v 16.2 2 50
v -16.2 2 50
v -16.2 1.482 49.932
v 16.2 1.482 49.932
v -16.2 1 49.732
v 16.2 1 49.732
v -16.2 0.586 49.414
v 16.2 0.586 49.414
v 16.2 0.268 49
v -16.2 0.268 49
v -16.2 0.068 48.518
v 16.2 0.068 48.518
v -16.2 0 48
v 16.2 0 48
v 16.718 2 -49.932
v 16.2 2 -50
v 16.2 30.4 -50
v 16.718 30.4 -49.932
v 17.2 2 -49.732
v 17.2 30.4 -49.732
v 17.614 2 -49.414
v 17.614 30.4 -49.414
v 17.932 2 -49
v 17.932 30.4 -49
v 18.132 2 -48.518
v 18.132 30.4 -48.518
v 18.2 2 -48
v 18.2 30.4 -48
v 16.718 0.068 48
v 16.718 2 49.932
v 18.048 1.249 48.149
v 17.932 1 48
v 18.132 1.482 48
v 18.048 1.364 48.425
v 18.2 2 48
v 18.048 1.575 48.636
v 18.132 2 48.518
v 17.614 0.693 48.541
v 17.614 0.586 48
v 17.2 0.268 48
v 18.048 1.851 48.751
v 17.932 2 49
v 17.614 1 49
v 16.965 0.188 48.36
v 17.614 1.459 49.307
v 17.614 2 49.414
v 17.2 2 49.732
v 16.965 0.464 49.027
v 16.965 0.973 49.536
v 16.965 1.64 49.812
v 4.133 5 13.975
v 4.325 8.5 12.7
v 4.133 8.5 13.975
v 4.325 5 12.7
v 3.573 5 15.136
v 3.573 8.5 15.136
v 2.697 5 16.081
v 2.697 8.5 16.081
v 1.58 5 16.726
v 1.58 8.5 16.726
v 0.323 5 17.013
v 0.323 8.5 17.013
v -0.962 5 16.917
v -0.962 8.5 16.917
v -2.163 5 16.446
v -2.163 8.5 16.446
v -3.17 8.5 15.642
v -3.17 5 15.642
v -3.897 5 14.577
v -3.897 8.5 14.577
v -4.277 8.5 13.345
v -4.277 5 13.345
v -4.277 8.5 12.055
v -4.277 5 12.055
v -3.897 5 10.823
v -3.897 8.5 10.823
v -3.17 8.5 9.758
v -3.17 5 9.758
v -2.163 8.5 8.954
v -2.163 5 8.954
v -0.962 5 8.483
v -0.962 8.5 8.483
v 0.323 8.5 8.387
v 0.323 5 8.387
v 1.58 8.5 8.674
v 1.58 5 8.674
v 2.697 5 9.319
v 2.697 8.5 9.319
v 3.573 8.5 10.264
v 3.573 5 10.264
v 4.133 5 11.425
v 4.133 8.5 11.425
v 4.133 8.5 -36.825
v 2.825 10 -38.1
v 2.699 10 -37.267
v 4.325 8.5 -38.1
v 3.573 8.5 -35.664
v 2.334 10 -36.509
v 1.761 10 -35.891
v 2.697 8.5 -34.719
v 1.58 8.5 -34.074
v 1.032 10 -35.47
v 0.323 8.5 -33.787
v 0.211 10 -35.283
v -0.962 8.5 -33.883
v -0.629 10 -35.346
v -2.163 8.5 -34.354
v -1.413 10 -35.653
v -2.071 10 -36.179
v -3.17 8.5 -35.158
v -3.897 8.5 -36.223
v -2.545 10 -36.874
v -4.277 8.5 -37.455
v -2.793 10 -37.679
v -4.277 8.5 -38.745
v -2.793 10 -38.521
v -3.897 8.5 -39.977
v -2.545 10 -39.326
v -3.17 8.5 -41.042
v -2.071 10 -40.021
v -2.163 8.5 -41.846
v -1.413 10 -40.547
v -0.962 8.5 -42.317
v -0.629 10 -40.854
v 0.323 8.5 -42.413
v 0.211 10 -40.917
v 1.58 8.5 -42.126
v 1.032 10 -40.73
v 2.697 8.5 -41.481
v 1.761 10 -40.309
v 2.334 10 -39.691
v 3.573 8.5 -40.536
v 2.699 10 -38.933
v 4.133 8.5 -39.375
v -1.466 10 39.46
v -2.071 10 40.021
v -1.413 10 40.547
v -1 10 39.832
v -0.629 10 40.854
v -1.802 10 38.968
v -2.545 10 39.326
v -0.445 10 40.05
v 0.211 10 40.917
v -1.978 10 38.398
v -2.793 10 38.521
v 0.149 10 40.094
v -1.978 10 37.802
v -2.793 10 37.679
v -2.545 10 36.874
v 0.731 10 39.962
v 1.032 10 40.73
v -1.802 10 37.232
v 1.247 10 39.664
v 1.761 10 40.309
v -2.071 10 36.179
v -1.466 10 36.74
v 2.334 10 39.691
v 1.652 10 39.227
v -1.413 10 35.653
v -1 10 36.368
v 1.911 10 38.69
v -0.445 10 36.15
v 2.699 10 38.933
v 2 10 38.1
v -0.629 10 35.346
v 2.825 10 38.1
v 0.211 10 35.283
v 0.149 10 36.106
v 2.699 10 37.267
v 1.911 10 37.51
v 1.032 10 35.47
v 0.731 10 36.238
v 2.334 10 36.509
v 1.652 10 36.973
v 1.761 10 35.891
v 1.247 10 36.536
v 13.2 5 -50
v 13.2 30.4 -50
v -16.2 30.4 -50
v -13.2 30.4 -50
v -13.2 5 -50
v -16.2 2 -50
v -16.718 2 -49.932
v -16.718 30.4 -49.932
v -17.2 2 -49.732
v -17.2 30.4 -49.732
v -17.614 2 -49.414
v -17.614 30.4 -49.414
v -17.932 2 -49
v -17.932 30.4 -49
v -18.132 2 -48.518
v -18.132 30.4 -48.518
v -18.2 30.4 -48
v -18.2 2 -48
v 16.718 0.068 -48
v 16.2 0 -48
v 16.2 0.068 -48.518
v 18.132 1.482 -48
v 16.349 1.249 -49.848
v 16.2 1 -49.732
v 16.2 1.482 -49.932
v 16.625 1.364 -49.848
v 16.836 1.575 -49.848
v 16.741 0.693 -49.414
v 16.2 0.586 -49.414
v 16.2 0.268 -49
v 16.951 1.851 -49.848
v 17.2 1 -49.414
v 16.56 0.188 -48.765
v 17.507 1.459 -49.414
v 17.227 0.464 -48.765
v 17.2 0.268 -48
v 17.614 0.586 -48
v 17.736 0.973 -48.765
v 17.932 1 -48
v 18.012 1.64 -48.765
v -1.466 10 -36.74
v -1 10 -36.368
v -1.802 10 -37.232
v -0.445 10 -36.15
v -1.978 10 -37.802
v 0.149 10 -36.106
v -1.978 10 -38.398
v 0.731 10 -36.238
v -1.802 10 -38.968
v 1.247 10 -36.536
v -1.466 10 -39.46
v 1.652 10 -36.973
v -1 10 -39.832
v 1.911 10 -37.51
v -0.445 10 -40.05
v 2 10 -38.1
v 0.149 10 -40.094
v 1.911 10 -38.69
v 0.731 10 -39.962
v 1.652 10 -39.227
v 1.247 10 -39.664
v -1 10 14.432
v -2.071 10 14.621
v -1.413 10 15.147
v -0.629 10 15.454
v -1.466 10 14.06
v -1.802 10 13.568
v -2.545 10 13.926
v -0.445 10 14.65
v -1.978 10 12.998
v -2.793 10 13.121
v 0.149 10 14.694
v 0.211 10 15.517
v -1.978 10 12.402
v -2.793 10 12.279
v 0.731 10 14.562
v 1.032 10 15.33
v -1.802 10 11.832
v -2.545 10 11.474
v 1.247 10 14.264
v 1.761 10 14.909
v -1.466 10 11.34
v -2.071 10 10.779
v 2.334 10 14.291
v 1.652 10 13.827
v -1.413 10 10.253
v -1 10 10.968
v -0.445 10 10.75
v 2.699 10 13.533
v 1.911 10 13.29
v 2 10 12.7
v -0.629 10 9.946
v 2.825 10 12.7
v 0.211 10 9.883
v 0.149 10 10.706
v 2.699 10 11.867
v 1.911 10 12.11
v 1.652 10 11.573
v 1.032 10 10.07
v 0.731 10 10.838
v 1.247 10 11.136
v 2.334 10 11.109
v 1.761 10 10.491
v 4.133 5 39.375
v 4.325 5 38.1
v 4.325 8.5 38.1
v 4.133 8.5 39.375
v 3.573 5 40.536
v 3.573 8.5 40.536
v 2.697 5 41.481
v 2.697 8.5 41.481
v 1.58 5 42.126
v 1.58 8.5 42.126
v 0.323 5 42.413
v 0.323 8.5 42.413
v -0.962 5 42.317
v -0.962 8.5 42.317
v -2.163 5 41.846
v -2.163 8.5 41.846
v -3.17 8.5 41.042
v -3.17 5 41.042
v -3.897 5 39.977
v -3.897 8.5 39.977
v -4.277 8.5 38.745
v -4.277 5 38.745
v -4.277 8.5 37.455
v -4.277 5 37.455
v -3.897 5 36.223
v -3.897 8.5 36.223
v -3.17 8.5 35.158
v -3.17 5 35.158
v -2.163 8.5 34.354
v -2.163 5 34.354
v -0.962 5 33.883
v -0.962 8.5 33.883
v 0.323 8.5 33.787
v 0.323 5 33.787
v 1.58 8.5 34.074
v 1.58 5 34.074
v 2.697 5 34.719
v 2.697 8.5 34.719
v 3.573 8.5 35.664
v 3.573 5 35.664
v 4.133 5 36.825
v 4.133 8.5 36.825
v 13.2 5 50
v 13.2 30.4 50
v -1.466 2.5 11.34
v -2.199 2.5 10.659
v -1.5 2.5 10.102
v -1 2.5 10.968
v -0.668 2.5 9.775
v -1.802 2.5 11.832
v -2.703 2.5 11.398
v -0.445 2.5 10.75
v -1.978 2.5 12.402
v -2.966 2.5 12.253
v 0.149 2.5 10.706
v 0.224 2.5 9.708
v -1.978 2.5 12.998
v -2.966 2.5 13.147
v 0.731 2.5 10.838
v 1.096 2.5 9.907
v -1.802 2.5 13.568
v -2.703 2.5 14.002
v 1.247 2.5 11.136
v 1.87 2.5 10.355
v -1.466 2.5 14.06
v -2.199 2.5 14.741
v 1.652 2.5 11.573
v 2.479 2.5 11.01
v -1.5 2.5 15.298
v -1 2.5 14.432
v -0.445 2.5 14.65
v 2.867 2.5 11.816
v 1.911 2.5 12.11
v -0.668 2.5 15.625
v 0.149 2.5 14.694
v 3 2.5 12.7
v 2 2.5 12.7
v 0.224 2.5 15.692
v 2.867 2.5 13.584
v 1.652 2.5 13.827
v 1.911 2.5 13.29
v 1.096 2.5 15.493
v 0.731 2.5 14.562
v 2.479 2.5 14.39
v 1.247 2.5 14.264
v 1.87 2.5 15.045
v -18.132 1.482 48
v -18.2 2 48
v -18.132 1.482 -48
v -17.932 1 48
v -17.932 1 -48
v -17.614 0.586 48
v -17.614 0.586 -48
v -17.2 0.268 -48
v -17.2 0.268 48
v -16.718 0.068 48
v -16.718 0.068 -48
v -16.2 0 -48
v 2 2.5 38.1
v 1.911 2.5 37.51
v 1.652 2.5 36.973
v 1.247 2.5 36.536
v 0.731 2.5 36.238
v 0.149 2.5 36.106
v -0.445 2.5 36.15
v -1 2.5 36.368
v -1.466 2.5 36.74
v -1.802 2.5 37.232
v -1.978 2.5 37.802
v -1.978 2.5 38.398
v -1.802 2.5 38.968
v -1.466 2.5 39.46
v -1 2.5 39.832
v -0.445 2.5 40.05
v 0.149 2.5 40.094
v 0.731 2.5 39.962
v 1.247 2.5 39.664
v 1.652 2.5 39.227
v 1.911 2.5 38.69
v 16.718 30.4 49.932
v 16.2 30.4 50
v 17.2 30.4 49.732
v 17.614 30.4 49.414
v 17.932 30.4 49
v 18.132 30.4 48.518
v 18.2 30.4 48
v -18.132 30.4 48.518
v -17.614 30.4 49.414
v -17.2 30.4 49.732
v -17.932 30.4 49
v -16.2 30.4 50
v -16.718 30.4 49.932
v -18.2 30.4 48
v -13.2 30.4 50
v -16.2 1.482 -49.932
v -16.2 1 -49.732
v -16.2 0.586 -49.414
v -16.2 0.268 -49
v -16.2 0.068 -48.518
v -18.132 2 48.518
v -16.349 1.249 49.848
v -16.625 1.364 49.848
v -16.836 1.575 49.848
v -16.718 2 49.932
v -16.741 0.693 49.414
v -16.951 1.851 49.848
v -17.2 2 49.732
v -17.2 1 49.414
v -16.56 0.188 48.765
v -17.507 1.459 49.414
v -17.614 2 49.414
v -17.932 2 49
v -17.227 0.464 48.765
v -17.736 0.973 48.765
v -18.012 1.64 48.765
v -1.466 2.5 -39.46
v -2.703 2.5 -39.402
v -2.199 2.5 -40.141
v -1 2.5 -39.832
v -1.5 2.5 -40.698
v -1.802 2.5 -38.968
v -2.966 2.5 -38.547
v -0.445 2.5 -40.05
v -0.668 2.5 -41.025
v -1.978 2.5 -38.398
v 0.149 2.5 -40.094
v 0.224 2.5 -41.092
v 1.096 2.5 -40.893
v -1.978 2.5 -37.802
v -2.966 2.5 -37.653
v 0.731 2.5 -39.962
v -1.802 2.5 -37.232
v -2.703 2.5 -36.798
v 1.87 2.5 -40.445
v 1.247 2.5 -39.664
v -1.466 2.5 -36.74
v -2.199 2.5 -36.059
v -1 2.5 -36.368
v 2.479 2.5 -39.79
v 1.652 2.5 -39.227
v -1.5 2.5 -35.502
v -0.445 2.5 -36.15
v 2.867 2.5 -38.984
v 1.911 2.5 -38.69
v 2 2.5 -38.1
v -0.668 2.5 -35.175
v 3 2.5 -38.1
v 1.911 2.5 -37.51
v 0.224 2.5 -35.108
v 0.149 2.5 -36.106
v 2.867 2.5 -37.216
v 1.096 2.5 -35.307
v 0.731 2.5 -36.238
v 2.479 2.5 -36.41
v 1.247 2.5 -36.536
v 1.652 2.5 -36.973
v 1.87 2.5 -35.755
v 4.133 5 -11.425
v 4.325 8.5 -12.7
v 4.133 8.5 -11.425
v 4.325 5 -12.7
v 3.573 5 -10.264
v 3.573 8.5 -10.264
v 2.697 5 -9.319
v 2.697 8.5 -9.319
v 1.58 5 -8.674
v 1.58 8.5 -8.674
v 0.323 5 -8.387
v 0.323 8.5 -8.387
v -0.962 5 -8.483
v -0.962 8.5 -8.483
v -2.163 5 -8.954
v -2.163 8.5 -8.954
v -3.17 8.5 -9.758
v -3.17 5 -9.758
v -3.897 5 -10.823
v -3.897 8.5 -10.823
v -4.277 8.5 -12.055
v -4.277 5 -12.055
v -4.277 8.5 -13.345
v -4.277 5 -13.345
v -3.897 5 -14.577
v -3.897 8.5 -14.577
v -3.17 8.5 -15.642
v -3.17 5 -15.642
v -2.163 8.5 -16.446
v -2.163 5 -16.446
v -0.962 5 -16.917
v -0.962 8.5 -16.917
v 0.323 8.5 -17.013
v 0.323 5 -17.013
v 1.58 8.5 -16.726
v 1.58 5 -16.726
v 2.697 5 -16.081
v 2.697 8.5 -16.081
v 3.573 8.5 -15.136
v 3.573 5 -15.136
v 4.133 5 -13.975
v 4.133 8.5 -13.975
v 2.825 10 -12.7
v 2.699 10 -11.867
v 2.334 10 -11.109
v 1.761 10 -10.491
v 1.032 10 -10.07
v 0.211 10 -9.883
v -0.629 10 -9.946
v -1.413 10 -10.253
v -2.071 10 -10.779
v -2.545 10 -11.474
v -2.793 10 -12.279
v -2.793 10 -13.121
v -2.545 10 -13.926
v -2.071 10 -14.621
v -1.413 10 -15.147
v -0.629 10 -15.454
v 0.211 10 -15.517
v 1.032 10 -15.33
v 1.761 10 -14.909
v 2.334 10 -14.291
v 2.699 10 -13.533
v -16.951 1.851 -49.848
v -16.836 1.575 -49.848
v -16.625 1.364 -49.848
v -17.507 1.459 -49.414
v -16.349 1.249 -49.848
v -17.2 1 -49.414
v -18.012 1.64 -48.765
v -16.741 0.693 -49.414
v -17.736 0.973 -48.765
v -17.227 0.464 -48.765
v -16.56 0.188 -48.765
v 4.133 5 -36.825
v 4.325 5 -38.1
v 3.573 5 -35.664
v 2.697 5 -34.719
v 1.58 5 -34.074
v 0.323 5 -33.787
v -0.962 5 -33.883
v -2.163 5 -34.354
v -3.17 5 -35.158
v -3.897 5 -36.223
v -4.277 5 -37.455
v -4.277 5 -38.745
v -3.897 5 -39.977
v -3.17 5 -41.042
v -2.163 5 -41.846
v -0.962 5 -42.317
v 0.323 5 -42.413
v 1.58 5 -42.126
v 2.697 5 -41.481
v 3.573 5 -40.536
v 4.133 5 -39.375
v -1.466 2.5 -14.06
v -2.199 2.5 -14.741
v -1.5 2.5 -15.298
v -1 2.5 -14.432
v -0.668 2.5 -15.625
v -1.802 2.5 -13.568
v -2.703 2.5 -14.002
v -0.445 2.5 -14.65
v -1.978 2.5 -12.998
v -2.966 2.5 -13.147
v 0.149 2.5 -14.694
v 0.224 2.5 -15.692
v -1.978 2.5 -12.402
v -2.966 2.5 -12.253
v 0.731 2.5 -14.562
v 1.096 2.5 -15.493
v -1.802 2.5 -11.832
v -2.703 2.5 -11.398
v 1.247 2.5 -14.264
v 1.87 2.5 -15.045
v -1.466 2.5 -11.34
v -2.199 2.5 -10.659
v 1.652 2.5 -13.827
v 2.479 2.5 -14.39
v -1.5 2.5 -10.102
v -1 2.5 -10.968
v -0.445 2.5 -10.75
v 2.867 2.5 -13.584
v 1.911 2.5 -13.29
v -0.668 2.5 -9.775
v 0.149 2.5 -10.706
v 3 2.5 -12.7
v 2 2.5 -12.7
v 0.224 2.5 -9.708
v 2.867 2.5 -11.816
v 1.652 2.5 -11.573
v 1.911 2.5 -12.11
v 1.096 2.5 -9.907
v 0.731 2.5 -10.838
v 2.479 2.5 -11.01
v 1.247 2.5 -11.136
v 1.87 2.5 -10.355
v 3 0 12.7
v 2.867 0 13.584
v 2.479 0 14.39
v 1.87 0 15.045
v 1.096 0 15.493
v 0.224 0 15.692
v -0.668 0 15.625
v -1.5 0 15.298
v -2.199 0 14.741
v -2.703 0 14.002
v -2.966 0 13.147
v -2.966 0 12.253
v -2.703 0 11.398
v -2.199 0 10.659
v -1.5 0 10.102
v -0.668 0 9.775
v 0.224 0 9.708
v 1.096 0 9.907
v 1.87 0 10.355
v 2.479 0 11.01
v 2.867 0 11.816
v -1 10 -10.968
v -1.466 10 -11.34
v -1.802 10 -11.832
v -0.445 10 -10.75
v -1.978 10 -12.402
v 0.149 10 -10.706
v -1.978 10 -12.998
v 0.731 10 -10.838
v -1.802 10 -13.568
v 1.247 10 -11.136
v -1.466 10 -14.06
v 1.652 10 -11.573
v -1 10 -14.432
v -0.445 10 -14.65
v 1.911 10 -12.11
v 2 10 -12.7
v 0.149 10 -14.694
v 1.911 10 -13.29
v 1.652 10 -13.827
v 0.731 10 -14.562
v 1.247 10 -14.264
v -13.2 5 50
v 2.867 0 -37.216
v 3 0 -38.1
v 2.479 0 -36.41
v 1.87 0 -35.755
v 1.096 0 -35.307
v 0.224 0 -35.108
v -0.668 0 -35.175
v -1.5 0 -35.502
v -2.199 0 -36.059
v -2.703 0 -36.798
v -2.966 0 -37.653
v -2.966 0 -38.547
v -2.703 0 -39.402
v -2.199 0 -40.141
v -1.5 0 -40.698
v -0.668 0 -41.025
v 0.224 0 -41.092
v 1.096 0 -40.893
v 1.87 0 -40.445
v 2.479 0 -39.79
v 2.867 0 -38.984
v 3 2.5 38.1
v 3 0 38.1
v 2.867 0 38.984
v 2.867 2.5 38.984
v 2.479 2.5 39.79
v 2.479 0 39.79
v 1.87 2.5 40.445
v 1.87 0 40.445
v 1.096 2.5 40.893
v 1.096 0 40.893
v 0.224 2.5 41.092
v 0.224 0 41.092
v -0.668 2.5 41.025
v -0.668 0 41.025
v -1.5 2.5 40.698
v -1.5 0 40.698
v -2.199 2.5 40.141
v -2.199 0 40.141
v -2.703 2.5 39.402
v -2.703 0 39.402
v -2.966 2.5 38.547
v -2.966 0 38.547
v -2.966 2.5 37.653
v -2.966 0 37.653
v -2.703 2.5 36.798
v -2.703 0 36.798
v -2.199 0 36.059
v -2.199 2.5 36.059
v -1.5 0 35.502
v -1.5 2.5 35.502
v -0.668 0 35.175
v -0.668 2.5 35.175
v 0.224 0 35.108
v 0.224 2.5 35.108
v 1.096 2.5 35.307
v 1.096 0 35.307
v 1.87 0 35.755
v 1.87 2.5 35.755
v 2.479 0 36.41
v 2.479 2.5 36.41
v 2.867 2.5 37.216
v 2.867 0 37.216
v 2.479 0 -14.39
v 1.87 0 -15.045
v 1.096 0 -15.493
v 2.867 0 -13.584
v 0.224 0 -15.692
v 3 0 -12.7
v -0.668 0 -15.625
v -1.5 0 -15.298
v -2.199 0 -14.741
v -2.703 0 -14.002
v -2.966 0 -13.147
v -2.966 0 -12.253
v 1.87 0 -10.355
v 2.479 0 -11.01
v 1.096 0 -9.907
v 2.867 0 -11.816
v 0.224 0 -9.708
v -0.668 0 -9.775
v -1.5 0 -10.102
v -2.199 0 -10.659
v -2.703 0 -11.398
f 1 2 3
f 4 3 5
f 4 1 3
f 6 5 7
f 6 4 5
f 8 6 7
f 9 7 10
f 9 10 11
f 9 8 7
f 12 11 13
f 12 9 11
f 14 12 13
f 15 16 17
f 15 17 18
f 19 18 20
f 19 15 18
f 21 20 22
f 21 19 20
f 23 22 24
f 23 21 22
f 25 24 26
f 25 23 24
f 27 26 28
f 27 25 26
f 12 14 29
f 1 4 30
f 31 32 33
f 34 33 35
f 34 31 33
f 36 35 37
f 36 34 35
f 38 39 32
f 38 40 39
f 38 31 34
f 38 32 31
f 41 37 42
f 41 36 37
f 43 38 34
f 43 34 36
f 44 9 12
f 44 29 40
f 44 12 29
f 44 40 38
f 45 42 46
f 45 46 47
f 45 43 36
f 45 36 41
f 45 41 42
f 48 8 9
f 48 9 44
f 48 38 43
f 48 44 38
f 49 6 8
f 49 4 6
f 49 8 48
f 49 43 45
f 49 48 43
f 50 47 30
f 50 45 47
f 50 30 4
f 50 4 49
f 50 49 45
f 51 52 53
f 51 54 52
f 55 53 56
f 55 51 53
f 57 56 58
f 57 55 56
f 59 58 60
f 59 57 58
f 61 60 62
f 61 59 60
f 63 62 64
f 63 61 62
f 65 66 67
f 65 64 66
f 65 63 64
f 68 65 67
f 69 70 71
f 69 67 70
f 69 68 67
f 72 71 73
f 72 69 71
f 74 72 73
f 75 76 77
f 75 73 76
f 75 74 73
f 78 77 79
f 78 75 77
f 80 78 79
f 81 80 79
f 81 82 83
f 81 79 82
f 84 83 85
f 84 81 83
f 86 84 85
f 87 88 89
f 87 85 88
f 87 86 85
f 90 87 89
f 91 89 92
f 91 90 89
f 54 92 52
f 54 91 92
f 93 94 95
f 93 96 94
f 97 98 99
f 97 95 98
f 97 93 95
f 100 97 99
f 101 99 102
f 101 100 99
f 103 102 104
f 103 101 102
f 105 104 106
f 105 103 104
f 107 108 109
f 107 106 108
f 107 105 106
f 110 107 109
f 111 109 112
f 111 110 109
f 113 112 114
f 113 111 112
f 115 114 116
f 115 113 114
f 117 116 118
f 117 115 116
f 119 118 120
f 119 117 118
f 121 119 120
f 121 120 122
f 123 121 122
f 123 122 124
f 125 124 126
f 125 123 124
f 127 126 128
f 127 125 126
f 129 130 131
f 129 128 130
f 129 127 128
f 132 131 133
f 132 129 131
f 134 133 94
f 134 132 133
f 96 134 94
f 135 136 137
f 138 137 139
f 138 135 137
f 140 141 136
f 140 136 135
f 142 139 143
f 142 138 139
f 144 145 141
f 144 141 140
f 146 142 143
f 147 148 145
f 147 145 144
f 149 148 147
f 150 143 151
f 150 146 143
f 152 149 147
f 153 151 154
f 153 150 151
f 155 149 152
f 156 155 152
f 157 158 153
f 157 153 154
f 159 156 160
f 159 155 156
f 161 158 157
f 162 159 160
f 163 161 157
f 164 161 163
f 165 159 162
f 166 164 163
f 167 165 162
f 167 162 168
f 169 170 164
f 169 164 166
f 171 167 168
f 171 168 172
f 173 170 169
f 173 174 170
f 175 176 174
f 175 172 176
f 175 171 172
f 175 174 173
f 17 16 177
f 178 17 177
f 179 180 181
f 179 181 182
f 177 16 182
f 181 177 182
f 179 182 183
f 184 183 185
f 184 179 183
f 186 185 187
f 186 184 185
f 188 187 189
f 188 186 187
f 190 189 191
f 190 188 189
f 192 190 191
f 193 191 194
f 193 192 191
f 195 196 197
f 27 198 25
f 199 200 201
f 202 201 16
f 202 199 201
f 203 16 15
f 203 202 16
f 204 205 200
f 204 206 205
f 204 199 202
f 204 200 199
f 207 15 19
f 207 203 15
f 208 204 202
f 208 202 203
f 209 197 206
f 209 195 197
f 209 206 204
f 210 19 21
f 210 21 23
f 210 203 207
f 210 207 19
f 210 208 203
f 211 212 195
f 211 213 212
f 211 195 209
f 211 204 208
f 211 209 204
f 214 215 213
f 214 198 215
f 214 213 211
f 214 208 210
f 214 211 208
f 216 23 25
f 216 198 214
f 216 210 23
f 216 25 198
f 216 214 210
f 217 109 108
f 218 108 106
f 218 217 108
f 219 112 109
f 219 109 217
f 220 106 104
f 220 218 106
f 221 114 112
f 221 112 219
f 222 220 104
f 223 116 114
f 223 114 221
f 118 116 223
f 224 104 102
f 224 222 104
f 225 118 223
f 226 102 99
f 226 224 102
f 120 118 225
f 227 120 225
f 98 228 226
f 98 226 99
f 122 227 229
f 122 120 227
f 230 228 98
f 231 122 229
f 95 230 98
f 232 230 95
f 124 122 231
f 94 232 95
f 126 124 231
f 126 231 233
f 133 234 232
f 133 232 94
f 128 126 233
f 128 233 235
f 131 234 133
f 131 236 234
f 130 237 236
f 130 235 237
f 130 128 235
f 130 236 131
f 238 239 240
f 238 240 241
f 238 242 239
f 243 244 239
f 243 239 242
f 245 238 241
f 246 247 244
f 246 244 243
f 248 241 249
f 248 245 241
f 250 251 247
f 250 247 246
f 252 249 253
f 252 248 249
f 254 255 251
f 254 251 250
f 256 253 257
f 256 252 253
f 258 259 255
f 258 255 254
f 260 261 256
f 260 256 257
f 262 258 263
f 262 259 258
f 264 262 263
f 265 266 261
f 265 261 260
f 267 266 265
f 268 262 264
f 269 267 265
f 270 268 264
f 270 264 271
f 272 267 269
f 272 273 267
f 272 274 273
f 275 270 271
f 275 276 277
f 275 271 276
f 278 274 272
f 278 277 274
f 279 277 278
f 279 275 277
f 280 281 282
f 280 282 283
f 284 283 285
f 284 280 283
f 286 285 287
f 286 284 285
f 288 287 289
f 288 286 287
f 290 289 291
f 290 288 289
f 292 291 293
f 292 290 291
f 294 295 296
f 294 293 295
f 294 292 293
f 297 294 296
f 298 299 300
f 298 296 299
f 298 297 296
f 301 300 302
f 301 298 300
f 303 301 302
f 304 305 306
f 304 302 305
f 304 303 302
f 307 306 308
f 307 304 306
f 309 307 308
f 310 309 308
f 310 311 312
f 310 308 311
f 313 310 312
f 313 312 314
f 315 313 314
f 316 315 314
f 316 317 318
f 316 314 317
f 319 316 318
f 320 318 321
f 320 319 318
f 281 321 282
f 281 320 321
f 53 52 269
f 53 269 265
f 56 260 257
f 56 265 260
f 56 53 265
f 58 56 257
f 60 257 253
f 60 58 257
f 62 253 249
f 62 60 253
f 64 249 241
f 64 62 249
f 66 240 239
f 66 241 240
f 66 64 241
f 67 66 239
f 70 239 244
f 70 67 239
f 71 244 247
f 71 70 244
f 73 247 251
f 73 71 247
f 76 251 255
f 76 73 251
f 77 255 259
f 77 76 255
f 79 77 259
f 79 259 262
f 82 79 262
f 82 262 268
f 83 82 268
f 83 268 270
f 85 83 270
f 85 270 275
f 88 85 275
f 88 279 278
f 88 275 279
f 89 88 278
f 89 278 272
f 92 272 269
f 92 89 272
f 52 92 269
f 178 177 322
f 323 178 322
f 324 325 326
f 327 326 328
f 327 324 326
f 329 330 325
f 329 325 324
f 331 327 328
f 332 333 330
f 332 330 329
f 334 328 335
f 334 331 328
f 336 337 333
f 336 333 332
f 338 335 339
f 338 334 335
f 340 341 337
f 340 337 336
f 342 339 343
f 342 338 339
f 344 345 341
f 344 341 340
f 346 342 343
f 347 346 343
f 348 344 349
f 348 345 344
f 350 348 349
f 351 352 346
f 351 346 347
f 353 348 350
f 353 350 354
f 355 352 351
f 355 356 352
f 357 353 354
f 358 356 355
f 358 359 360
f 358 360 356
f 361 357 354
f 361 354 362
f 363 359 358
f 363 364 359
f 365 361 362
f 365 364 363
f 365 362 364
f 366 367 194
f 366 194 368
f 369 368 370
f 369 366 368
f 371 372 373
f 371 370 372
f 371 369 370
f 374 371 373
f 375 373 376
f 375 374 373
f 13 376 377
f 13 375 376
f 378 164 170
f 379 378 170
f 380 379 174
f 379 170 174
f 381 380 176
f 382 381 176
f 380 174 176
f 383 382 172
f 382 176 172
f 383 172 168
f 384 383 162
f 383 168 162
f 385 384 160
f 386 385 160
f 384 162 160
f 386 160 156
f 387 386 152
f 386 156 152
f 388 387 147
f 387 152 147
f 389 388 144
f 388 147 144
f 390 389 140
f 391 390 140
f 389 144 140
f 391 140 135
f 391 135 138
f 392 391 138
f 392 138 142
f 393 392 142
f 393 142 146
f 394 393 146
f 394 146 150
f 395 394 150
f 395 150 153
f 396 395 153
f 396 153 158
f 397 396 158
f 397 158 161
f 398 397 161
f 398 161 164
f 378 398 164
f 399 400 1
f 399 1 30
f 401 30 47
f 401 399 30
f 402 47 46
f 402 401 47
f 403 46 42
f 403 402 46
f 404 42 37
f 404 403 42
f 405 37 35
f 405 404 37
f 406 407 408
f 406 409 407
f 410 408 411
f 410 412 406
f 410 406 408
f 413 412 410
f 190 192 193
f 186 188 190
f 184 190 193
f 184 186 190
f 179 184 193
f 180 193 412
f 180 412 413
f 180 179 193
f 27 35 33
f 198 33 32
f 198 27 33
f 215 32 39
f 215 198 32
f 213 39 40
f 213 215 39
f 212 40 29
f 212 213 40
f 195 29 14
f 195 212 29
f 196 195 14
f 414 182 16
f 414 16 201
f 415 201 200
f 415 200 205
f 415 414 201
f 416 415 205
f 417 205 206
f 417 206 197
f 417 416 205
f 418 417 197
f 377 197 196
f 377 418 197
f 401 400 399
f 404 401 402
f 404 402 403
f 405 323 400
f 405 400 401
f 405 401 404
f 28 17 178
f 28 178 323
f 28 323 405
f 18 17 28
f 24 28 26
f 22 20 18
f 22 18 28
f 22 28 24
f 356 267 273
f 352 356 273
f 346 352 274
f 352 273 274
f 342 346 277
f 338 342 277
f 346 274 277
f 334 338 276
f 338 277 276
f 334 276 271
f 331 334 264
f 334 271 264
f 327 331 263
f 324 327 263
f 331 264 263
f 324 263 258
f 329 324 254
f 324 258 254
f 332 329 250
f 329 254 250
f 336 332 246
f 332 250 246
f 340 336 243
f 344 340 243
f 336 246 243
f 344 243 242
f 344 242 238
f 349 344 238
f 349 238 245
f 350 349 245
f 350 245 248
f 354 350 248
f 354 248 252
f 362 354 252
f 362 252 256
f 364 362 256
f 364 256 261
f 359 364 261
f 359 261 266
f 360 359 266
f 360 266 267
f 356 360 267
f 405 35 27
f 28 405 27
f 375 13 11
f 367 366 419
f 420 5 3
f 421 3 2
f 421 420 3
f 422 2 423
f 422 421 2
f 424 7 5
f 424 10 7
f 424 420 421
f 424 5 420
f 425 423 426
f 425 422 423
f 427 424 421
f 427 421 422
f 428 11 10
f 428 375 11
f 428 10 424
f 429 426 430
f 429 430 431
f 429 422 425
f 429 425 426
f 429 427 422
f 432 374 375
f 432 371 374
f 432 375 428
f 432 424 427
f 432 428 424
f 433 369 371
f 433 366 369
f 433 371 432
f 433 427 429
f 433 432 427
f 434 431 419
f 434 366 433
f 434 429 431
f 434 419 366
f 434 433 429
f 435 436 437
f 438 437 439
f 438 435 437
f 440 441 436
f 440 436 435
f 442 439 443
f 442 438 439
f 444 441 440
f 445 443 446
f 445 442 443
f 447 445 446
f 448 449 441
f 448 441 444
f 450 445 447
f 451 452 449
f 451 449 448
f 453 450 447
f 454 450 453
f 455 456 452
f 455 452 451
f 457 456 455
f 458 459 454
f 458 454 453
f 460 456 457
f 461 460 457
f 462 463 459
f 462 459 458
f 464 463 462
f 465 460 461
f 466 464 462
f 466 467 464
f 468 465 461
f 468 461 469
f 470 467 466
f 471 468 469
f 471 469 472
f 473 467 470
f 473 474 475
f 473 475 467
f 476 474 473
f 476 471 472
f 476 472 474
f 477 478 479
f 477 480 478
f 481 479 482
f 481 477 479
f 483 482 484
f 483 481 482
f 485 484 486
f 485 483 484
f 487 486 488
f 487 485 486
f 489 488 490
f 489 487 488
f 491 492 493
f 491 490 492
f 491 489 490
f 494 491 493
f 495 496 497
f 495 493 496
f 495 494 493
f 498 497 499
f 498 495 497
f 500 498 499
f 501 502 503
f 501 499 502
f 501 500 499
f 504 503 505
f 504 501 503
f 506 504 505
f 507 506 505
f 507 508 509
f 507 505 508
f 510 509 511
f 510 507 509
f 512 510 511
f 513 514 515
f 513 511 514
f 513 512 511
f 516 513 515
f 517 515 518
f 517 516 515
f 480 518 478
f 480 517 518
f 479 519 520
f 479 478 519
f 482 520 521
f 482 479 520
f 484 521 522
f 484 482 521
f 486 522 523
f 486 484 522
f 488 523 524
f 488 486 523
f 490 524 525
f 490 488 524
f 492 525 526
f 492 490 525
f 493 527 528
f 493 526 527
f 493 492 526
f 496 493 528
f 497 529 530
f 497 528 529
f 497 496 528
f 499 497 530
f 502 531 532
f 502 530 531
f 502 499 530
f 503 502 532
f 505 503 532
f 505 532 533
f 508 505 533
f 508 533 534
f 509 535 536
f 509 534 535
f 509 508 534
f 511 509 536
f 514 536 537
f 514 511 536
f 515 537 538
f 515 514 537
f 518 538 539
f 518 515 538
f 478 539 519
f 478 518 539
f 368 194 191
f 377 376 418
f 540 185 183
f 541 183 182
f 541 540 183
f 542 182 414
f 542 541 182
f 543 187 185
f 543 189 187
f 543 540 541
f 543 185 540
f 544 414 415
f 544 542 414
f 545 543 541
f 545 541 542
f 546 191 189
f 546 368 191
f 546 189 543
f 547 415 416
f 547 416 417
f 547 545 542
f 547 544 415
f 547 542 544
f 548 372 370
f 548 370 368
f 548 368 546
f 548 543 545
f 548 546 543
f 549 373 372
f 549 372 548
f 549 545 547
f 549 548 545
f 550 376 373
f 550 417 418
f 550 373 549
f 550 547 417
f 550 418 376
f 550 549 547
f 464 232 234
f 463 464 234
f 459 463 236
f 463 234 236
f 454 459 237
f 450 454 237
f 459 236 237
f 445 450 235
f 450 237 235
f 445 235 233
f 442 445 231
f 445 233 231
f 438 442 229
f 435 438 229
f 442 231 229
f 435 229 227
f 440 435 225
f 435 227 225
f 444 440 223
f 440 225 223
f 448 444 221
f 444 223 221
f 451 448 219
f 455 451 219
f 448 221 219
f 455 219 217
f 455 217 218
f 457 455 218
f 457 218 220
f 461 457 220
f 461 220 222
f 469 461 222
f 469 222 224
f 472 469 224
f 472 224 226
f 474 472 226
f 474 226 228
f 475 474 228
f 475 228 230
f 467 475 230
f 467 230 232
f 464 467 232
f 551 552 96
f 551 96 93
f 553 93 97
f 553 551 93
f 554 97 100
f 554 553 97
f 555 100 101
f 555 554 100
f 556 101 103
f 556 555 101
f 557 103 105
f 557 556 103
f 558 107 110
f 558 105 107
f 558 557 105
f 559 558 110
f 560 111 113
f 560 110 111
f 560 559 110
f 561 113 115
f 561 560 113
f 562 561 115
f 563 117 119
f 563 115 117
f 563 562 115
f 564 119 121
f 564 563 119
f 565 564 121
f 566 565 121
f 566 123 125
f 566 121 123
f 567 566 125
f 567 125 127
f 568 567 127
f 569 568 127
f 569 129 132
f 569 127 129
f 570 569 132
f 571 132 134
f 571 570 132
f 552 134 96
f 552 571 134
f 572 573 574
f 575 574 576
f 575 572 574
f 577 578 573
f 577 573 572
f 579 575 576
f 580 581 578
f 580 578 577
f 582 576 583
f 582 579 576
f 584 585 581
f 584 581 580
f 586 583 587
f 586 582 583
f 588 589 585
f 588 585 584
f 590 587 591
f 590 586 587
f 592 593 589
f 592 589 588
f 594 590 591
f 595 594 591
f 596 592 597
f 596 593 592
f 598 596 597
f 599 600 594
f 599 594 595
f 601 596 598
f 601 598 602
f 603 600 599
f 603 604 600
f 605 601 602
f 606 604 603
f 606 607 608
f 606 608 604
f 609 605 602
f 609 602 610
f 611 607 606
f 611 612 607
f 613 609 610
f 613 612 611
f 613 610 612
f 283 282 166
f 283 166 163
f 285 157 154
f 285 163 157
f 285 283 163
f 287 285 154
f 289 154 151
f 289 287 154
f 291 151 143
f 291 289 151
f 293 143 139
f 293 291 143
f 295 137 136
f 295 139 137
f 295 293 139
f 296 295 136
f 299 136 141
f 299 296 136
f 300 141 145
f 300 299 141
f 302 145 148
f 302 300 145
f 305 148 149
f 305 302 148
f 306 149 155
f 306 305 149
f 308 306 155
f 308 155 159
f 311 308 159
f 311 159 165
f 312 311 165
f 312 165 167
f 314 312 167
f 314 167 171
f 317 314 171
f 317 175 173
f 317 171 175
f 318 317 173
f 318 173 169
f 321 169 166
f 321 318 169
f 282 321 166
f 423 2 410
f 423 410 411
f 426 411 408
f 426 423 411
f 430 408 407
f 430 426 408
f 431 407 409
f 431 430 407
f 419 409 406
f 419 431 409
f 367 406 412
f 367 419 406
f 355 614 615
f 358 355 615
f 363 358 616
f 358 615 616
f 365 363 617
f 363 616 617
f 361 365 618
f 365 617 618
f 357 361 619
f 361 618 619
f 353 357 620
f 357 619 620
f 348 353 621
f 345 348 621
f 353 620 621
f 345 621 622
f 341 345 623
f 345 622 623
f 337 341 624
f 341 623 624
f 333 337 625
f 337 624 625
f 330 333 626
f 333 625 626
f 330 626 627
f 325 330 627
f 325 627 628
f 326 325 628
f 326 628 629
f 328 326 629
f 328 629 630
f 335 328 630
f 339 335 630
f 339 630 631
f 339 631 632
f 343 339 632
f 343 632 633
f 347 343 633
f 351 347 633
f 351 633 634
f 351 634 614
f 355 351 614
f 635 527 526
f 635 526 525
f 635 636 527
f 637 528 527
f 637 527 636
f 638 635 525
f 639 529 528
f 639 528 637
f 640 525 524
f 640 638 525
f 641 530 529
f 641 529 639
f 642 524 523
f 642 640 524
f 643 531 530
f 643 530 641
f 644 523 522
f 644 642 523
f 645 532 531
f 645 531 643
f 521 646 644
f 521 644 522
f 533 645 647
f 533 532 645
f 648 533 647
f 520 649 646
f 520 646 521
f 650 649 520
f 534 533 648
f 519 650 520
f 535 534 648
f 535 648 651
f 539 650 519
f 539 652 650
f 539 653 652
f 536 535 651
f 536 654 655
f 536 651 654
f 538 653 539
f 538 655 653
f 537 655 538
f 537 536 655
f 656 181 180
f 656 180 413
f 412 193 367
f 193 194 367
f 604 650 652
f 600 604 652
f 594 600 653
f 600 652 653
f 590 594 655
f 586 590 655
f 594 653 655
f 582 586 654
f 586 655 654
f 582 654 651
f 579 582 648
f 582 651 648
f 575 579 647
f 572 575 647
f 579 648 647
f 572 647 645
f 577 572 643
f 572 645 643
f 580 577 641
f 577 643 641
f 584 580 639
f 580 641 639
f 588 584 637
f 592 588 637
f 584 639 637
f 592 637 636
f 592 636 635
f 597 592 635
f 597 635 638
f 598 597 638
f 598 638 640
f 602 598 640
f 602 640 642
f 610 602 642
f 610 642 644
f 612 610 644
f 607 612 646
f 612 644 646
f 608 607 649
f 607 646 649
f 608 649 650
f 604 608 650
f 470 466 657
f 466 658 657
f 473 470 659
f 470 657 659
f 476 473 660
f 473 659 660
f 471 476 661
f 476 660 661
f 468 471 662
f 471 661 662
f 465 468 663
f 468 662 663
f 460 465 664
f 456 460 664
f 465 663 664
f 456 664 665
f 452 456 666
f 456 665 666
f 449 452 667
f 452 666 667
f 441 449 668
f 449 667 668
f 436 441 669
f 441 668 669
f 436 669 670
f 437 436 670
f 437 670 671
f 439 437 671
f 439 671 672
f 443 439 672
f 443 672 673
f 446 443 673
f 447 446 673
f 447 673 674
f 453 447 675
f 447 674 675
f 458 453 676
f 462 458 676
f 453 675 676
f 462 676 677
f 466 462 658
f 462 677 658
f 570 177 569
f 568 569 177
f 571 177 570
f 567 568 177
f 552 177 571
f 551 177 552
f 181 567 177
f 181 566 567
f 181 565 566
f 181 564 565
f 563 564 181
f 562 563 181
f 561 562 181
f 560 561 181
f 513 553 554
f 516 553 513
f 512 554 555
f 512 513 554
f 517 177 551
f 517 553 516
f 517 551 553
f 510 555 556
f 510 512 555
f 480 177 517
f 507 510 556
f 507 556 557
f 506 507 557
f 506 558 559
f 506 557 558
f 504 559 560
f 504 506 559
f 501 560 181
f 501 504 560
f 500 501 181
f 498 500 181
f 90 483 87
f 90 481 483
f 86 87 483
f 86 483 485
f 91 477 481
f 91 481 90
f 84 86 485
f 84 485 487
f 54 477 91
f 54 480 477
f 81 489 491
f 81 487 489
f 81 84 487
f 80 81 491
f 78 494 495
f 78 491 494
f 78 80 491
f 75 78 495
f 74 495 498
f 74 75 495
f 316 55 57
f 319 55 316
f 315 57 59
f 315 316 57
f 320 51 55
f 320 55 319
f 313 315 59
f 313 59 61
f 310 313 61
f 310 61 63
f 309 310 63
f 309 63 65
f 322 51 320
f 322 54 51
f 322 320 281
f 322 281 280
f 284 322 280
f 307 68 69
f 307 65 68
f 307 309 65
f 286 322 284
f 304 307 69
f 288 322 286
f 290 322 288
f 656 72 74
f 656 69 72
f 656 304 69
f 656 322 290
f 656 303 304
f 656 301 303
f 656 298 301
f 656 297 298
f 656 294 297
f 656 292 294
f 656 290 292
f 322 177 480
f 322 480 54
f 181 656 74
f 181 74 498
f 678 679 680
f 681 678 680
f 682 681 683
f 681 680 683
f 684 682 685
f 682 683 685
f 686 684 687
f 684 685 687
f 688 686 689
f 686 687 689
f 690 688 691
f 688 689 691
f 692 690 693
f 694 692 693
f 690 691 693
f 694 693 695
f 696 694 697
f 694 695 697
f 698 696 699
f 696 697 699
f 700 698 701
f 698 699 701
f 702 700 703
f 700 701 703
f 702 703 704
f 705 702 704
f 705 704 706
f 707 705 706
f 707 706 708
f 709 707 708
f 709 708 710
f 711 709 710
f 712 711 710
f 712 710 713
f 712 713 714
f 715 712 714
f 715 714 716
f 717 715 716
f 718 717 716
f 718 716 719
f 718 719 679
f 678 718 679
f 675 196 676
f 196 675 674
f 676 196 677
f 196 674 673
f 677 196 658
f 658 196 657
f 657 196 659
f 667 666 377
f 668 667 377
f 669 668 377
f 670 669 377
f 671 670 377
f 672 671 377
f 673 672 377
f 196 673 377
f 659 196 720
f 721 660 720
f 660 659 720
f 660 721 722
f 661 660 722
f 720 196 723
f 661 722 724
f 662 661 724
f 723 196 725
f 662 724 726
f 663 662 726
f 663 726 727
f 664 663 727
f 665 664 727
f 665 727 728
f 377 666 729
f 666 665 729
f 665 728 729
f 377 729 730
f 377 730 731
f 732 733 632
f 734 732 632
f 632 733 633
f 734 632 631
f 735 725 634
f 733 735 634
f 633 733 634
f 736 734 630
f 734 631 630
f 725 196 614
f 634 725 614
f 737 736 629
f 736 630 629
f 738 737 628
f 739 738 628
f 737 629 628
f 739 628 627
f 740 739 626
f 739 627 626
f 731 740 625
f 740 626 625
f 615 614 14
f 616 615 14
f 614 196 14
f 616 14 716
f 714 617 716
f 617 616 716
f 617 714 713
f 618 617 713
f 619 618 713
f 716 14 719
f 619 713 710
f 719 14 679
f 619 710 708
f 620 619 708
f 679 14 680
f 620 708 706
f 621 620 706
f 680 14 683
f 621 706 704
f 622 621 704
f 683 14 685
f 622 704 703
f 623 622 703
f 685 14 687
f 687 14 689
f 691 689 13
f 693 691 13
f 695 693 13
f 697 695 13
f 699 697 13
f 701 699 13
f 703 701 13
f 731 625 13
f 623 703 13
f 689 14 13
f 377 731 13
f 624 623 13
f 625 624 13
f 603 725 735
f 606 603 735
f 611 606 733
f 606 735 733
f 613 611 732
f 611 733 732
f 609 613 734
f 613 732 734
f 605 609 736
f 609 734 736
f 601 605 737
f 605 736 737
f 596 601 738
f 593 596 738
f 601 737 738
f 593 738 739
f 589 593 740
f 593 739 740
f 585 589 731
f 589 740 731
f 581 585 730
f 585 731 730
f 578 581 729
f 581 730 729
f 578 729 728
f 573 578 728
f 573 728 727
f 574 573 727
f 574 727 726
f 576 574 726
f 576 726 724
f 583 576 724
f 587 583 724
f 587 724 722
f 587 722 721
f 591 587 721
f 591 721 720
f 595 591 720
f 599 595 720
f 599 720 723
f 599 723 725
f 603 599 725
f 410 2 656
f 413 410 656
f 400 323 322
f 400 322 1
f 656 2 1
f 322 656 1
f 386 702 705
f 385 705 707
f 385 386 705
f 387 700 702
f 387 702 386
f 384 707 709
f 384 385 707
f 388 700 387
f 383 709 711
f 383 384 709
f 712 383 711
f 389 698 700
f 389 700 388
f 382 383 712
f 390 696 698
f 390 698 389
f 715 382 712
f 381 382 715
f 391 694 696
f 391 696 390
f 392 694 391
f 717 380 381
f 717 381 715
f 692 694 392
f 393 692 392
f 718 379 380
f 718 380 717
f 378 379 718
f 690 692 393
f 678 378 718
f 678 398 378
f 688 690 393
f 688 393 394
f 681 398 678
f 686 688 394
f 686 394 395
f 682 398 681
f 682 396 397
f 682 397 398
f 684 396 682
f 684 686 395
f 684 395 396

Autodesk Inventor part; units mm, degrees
ref_plane "YZ Plane" through (0, 0, 0) normal (1, 0, 0) x (0, 1, 0)
ref_plane "XZ Plane" through (0, 0, 0) normal (0, 1, 0) x (-1, 0, 0)
ref_plane "XY Plane" through (0, 0, 0) normal (0, 0, 1) x (1, 0, 0)
sketch "Sketch1" plane through (0, 0, 0) normal (0, 1, 0) x (-1, 0, 0)
  line L0 (18.2, 50) -> (-18.2, 50)
  line L1 (-18.2, 50) -> (-18.2, -50)
  line L2 (-18.2, -50) -> (18.2, -50)
  line L3 (18.2, -50) -> (18.2, 50)
  point P0 (0, 0)
  dimension "d0" = 36.4
  dimension "d1" = 100
extrude "Extrusion1" add sketch "Sketch1" along normal blind 5
sketch "Sketch2" plane through (0, 5, 0) normal (0, 1, 0) x (1, 0, 0)
  circle A0 centre (0, 12.7) radius 4.325
  circle A1 centre (0, -12.7) radius 4.325
  circle A2 centre (0, -38.1) radius 4.325
  circle A3 centre (0, 38.1) radius 4.325
  point P0 (0, 0)
  dimension "d4" = 8.65
  dimension "d5" = 8.65
  dimension "d6" = 8.65
  dimension "d7" = 8.65
extrude "Extrusion2" add sketch "Sketch2" along normal blind 5
chamfer "Chamfer1" distance 1.5 angle 45 4 edges at (-4.325, 10, 38.1) (-4.325, 10, 12.7) (-4.325, 10, -12.7) (-4.325, 10, -38.1)
sketch "Sketch3" plane through (0, 5, 0) normal (0, 1, 0) x (1, 0, 0)
  line L0 (-18.2, 50) -> (-18.2, -50) projected
  line L1 (-18.2, -50) -> (18.2, -50) projected
  line L2 (-18.2, 50) -> (-13.2, 50)
  line L3 (-13.2, 50) -> (-13.2, -50)
  line L4 (-13.2, -50) -> (-18.2, -50)
  line L5 (-18.2, -50) -> (-18.2, 50)
  line L6 (18.2, -50) -> (18.2, 50) projected
  line L7 (18.2, 50) -> (13.2, 50)
  line L8 (13.2, 50) -> (13.2, -50)
  line L9 (13.2, -50) -> (18.2, -50)
  line L10 (18.2, -50) -> (18.2, 50)
  point P0 (0, 0)
  dimension "d13" = 5
  dimension "d14" = 5
extrude "Extrusion3" add sketch "Sketch3" along normal blind 25.4
sketch "Sketch4" plane through (0, 10, 38.1) normal (0, 1, 0) x (1, 0, 0)
  circle A0 centre (0, 0) radius 2.825 projected
  circle A1 centre (0, 0) radius 2
  circle A2 centre (0, 25.4) radius 2.825 projected
  circle A3 centre (0, 25.4) radius 2
  circle A4 centre (0, 50.8) radius 2.825 projected
  circle A5 centre (0, 50.8) radius 2
  circle A6 centre (0, 76.2) radius 2.825 projected
  circle A7 centre (0, 76.2) radius 2
  point P0 (0, 38.1)
  dimension "d17" = 4
  dimension "d18" = 4
  dimension "d19" = 4
  dimension "d20" = 4
extrude "Extrusion4" cut sketch "Sketch4" against normal blind 25.4 contours A1 | A3 | A5 | A7
sketch "Sketch5" plane through (0, 0, 0) normal (0, -1, 0) x (1, 0, 0)
  circle A0 centre (0, 38.1) radius 2.825 projected
  circle A1 centre (0, 38.1) radius 3
  circle A2 centre (0, 12.7) radius 2 projected
  circle A3 centre (0, 12.7) radius 3
  circle A4 centre (0, -12.7) radius 3
  circle A5 centre (0, -38.1) radius 2 projected
  circle A6 centre (0, -38.1) radius 3
  point P0 (0, 0)
  dimension "d23" = 6
  dimension "d24" = 6
  dimension "d25" = 6
  dimension "d26" = 6
extrude "Extrusion5" cut sketch "Sketch5" against normal blind 2.5 contours A0 | A1 | A2 | A3 | A4 | A5 | A6
fillet "Fillet1" radius 2 8 edges at (-18.2, 0, 0) (0, 0, 50) (18.2, 0, 0) (0, 0, -50) (-18.2, 15.2, -50) (-18.2, 15.2, 50) (18.2, 15.2, 50) (18.2, 15.2, -50)
properties part number "CBCaseMount"
